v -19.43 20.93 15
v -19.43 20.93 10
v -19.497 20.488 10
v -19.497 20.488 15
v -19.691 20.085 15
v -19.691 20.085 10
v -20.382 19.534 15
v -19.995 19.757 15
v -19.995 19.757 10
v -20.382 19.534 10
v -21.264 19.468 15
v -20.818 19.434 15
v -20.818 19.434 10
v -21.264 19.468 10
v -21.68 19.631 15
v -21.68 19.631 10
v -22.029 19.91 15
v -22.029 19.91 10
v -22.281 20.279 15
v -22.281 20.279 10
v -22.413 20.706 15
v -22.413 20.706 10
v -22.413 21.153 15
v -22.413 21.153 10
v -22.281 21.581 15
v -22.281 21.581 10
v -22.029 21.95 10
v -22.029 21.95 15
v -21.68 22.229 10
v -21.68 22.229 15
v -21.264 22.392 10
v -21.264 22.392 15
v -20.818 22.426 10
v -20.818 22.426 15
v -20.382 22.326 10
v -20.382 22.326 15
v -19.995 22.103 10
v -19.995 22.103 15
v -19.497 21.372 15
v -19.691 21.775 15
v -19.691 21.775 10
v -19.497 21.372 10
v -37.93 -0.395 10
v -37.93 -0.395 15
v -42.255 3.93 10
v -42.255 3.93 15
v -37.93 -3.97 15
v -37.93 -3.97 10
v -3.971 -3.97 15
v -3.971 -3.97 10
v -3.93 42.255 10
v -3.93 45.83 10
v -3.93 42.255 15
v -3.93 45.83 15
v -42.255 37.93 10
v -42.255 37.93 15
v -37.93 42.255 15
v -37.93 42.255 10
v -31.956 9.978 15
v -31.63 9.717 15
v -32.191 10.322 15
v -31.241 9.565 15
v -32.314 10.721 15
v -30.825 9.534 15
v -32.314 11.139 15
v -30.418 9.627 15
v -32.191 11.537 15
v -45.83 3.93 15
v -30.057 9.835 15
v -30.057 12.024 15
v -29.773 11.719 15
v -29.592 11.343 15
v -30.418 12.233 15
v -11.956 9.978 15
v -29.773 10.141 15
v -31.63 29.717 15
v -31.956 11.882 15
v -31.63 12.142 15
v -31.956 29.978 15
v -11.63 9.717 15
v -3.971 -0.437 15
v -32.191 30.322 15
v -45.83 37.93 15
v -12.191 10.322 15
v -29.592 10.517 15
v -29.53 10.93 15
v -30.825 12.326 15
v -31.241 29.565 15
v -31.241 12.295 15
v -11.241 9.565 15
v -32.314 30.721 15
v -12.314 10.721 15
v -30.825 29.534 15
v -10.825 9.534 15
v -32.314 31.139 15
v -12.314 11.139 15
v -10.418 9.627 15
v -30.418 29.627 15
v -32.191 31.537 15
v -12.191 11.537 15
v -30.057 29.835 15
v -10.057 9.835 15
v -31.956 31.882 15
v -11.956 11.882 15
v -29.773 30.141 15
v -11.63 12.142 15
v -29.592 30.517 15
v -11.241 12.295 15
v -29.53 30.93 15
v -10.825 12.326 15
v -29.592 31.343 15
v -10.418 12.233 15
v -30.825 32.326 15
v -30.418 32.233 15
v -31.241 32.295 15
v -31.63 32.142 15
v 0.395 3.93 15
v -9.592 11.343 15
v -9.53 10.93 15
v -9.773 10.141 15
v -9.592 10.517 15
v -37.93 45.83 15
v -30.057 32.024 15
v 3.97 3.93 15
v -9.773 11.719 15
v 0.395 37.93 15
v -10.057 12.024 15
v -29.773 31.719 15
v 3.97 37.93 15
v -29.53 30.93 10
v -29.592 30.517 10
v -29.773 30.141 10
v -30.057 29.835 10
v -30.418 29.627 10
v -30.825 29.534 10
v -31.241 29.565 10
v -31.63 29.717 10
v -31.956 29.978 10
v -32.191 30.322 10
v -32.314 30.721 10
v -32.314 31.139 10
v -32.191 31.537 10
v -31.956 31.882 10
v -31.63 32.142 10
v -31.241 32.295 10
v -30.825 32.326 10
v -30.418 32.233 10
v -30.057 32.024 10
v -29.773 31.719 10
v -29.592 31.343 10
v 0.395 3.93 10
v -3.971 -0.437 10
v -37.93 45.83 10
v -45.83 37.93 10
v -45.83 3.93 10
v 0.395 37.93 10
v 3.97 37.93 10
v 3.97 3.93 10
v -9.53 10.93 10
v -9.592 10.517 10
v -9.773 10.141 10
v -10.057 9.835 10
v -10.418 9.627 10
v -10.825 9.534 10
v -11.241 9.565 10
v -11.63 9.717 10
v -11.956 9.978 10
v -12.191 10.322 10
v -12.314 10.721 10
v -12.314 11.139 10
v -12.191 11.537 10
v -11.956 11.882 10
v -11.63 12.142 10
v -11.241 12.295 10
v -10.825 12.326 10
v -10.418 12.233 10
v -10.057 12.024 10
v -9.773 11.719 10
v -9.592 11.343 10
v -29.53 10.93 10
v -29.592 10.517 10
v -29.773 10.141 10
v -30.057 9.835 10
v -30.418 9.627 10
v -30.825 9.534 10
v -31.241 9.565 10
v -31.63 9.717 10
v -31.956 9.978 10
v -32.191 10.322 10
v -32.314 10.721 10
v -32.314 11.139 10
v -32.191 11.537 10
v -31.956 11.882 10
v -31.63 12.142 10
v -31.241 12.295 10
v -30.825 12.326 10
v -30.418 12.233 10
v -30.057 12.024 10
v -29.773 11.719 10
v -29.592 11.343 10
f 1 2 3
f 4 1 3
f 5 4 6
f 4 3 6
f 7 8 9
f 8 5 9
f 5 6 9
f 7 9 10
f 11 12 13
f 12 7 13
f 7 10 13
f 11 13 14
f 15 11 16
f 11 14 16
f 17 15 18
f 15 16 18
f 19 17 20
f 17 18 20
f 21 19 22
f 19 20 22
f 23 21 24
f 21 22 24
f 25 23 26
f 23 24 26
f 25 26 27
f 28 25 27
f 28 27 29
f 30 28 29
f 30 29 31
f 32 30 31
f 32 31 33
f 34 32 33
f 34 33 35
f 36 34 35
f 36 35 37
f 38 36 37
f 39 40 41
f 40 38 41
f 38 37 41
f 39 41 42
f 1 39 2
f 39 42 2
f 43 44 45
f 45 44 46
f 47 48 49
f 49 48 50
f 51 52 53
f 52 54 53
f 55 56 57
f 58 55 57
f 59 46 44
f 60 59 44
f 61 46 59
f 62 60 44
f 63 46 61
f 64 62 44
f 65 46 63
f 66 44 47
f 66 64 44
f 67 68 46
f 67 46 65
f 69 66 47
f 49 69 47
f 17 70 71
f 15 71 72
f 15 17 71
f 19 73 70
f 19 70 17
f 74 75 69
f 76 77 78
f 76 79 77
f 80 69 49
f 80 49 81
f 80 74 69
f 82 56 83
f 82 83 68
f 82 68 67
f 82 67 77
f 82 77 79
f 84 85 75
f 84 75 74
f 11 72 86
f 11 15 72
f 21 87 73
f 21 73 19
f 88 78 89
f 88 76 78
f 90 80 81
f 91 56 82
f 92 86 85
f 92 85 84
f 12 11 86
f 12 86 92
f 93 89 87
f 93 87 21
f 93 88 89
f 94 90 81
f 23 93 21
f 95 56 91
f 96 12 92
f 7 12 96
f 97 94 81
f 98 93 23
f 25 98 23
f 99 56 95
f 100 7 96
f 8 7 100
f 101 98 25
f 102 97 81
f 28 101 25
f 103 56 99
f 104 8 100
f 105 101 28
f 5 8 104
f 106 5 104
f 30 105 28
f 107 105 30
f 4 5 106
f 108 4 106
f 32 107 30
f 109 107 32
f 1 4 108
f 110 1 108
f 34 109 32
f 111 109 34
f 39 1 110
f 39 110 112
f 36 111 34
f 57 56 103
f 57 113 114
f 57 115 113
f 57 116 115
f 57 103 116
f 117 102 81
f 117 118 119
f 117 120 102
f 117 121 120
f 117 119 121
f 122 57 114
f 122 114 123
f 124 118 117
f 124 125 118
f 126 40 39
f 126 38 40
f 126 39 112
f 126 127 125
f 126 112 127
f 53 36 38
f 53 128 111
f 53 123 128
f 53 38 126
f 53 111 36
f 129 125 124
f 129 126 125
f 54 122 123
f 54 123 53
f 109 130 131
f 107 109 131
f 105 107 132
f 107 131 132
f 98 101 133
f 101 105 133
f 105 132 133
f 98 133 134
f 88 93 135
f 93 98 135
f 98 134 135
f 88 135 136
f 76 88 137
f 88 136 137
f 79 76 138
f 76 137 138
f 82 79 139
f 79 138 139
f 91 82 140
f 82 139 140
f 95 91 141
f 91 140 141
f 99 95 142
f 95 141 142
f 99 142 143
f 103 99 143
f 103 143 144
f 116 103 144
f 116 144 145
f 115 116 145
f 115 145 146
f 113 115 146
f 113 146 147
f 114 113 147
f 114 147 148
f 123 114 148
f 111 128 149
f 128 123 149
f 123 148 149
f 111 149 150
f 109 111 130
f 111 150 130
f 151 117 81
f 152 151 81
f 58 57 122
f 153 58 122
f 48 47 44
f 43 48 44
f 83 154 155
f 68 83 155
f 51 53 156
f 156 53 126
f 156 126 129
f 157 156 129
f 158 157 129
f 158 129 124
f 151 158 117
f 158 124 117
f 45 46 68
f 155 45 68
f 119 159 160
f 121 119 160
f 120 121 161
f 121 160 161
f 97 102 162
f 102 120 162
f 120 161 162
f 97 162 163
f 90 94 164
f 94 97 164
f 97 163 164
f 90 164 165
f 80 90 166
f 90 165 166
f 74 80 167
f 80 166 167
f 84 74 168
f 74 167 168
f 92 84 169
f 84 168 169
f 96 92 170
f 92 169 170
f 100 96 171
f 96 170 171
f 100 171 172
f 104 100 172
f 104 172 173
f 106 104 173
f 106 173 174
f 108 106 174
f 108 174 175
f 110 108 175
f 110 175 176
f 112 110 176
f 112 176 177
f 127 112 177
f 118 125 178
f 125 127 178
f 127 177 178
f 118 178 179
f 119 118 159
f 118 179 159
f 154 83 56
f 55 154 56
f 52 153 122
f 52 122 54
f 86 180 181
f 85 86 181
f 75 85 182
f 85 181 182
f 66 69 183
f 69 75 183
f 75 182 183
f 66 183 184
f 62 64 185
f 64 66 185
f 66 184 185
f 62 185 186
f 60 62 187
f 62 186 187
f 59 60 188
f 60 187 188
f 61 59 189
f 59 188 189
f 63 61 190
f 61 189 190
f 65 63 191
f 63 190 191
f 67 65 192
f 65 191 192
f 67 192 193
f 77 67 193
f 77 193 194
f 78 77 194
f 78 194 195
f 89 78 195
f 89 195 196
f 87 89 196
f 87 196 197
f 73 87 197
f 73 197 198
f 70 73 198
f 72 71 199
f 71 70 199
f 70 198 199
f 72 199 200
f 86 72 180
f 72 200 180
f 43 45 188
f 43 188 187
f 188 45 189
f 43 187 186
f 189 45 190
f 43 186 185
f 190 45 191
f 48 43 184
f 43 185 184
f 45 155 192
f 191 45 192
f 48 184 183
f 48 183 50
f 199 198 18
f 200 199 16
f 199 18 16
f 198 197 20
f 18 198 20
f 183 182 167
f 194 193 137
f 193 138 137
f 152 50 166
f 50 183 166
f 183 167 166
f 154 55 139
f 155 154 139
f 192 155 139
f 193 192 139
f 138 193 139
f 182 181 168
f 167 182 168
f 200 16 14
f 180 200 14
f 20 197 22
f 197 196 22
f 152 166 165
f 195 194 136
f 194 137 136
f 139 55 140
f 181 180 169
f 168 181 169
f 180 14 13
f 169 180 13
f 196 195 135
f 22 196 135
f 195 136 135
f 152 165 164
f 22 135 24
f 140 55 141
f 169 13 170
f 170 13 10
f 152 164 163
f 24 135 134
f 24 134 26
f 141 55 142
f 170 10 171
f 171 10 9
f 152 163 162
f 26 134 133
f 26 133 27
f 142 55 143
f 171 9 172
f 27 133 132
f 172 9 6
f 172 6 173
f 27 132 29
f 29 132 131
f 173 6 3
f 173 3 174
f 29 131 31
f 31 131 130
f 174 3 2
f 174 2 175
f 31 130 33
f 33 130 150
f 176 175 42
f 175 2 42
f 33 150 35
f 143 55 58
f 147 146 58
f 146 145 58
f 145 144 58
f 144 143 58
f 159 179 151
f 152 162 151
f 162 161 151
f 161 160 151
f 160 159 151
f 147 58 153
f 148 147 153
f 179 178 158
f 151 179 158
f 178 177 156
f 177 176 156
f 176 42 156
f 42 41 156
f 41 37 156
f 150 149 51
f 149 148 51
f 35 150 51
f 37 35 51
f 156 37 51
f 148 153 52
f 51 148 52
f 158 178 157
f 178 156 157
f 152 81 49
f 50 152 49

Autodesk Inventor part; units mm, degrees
ref_plane "YZ Plane" through (0, 0, 0) normal (1, 0, 0) x (0, 1, 0)
ref_plane "XZ Plane" through (0, 0, 0) normal (0, 1, 0) x (-1, 0, 0)
ref_plane "Work Plane1" through (0, 0, 10) normal (0, 0, 1) x (1, 0, 0)
sketch "Sketch1" plane through (0, 0, 10) normal (0, 0, 1) x (1, 0, 0)
  line L0 (-4.0299, -0.3538) -> (-2.2322, 1.4439) construction
  arc A0 (-1.4439, 2.2322) -> (-2.2322, 1.4439) centre (-0.9299, 0.9299) ccw construction
  line L1 (-1.4439, 2.2322) -> (0.3538, 4.0299) construction
  line L2 (-37.8299, 42.8299) -> (-37.8299, 37.8299) construction
  line L3 (-37.8299, 37.8299) -> (-42.9208, 37.8299) construction
  line L4 (-37.8299, 42.2137) -> (-37.8299, 45.8299) construction
  line L5 (-37.8299, 45.8299) -> (-4.0299, 45.8299) construction
  line L6 (-4.0299, 45.8299) -> (-4.0299, 42.2137) construction
  line L7 (-4.0299, 4.0299) -> (0.3538, 4.0299) projected
  circle A1 centre (-20.9299, 20.9299) radius 17.5 projected
  line L8 (-20.9299, 58.9723) -> (17.1124, 20.9299) construction
  line L9 (17.1124, 20.9299) -> (-20.9299, -17.1124) construction
  line L10 (-20.9299, -17.1124) -> (-58.9723, 20.9299) construction
  line L11 (-58.9723, 20.9299) -> (-20.9299, 58.9723) construction
  line L12 (-20.9299, 58.9723) -> (-20.9299, -17.1124) construction
  line L13 (17.1124, 20.9299) -> (-58.9723, 20.9299) construction
  line L14 (-20.9299, 58.9723) -> (32.8701, 58.9723) construction
  line L15 (-43.4299, 43.4299) -> (1.5701, 43.4299) construction
  line L16 (1.5701, 43.4299) -> (1.5701, -1.5701) construction
  line L17 (1.5701, -1.5701) -> (-43.4299, -1.5701) construction
  line L18 (-43.4299, -1.5701) -> (-43.4299, 43.4299) construction
  line L19 (-43.4299, 43.4299) -> (1.5701, -1.5701) construction
  line L20 (1.5701, 43.4299) -> (-43.4299, -1.5701) construction
  line L21 (-43.4299, 5.3876) -> (-43.4299, 36.4723)
  line L22 (-43.4299, 36.4723) -> (-36.4723, 43.4299)
  line L23 (-36.4723, 43.4299) -> (-5.3876, 43.4299)
  line L24 (-5.3876, 43.4299) -> (1.5701, 36.4723)
  line L25 (1.5701, 36.4723) -> (1.5701, 5.3876)
  line L26 (1.5701, 5.3876) -> (-5.3876, -1.5701)
  line L27 (-5.3876, -1.5701) -> (-36.4723, -1.5701)
  line L28 (-36.4723, -1.5701) -> (-43.4299, 5.3876)
  line L29 (-4.0299, 42.2137) -> (-37.8299, 42.2137) projected
  line L30 (-4.0299, -0.3538) -> (-4.0299, 4.0299) projected
  circle A2 centre (-20.9299, 20.9299) radius 1.5
  line L31 (-10.9299, 10.9299) -> (-30.9299, 10.9299) construction
  line L32 (-30.9299, 10.9299) -> (-30.9299, 30.9299) construction
  line L33 (-30.9299, 30.9299) -> (-10.9299, 30.9299) construction
  line L34 (-10.9299, 30.9299) -> (-10.9299, 10.9299) construction
  line L35 (-10.9299, 10.9299) -> (-30.9299, 30.9299) construction
  line L36 (-30.9299, 10.9299) -> (-10.9299, 30.9299) construction
  circle A3 centre (-30.9299, 30.9299) radius 1.4
  circle A4 centre (-30.9299, 10.9299) radius 1.4
  circle A5 centre (-10.9299, 10.9299) radius 1.4
  line L37 (-45.8299, 37.8299) -> (-42.0723, 37.8299) construction
  line L38 (-42.1723, 37.7299) -> (-45.8299, 37.7299)
  line L39 (-45.8299, 37.7299) -> (-45.8299, 4.1299)
  line L40 (-45.8299, 4.1299) -> (-42.1723, 4.1299)
  line L41 (-42.1723, 4.1299) -> (-42.1723, 37.7299)
  line L42 (-45.8299, 4.0299) -> (-42.0723, 4.0299) construction
  line L43 (-45.8299, 37.8299) -> (-42.0723, 37.8299) projected
  line L44 (-37.7299, 45.8299) -> (-4.1299, 45.8299)
  line L45 (-4.1299, 45.8299) -> (-4.1299, 42.1723)
  line L46 (-4.1299, 42.1723) -> (-37.7299, 42.1723)
  line L47 (-37.7299, 42.1723) -> (-37.7299, 45.8299)
  line L48 (0.4701, 37.8299) -> (0.4701, 4.0299) construction
  line L49 (0.4701, 4.0299) -> (3.9701, 4.0299) construction
  line L50 (3.9701, 37.8299) -> (3.9701, 4.0299) construction
  line L51 (0.4701, 37.8299) -> (3.9701, 37.8299) construction
  line L52 (-45.8299, -3.9701) -> (-4.0299, -3.9701) construction
  line L53 (0.3124, 37.7299) -> (3.9701, 37.7299)
  line L54 (3.9701, 37.7299) -> (3.9701, 4.1299)
  line L55 (3.9701, 4.1299) -> (0.3124, 4.1299)
  line L56 (0.3124, 4.1299) -> (0.3124, 37.7299)
  line L57 (-4.1713, -0.3538) -> (-37.7299, -0.3538)
  line L58 (-37.7299, -0.3538) -> (-37.7299, -3.9701)
  line L59 (-37.7299, -3.9701) -> (-4.1713, -3.9701)
  line L60 (-4.1713, -3.9701) -> (-4.1713, -0.3538)
  point P0 (-37.8299, 4.0299)
  dimension "d18" = 53.8
  dimension "d19" = 45
  dimension "d20" = 53.8
  dimension "d21" = 45
  dimension "d22" = 45
  dimension "d30" = 20
  dimension "d31" = 20
  dimension "d32" = 2.8
  dimension "d33" = 2.8
  dimension "d34" = 2.8
  dimension "d35" = 3
  dimension "d36" = 0.1
  dimension "d37" = 0.1
  dimension "d38" = 0.1
  dimension "d39" = 0.1
extrude "Extrusion1" add sketch "Sketch1" along normal blind 5 contours L30 L26 L57 L28 L41 L22 L46 L24 L56 L7 | L7 L26 L30 | L56 L24 L25 L26 | L26 L25 L24 L53 L54 L55 | L60 L59 L58 L57 L28 L27 L26 | L26 L27 L28 L57 | L46 L22 L29 L24 | L24 L29 L45 | L40 L39 L38 L22 L21 L28 | L28 L21 L22 L41 | L29 L22 L23 L24 | L24 L23 L22 L29 L47 L44 L45 | L47 L29 L22 | A1
sketch "Skizze4" plane through (0, 0, 15) normal (0, 0, 1) x (1, 0, 0)
  circle A0 centre (-10.9299, 10.9299) radius 1.4 construction
  circle A1 centre (-30.9299, 10.9299) radius 1.4 construction
  circle A2 centre (-30.9299, 30.9299) radius 1.4 construction
  circle A3 centre (-20.9299, 20.9299) radius 1.5 construction
  line L0 (-37.7299, 42.1723) -> (-42.1723, 37.7299) projected
  line L1 (-42.1723, 37.7299) -> (-45.8299, 37.7299) projected
  line L2 (-45.8299, 37.7299) -> (-45.8299, 4.1299) construction
  line L3 (-45.8299, 4.1299) -> (-42.1723, 4.1299) projected
  line L4 (-42.1723, 4.1299) -> (-37.6885, -0.3538) projected
  line L5 (-37.6885, -0.3538) -> (-37.7299, -0.3538) projected
  line L6 (-37.7299, -0.3538) -> (-37.7299, -3.9701) projected
  line L7 (-37.7299, -3.9701) -> (-4.1713, -3.9701) construction
  line L8 (-4.1713, -3.9701) -> (-4.1713, -0.3538) projected
  line L9 (-4.1713, -0.3538) -> (0.3124, 4.1299) projected
  line L10 (0.3124, 4.1299) -> (3.9701, 4.1299) projected
  line L11 (3.9701, 4.1299) -> (3.9701, 37.7299) construction
  line L12 (3.9701, 37.7299) -> (0.3124, 37.7299) projected
  line L13 (0.3124, 37.7299) -> (-4.1299, 42.1723) projected
  line L14 (-4.1299, 42.1723) -> (-4.1299, 45.8299) projected
  line L15 (-4.1299, 45.8299) -> (-37.7299, 45.8299) construction
  line L16 (-37.7299, 45.8299) -> (-37.7299, 42.1723) projected
  line L17 (-37.9299, 46.0299) -> (-3.9299, 46.0299) construction
  line L18 (-3.9299, 46.0299) -> (-3.9299, 42.2551)
  line L19 (-3.9299, 42.2551) -> (0.3953, 37.9299)
  line L20 (0.3953, 37.9299) -> (4.1701, 37.9299)
  line L21 (4.1701, 37.9299) -> (4.1701, 3.9299) construction
  line L22 (4.1701, 3.9299) -> (0.3953, 3.9299)
  line L23 (0.3953, 3.9299) -> (-3.9713, -0.4367)
  line L24 (-3.9713, -0.4367) -> (-3.9713, -4.1701)
  line L25 (-3.9713, -4.1701) -> (-37.9299, -4.1701) construction
  line L26 (-37.9299, -4.1701) -> (-37.9299, -0.3953)
  line L27 (-37.9299, -0.3953) -> (-42.2551, 3.9299)
  line L28 (-42.2551, 3.9299) -> (-46.0299, 3.9299)
  line L29 (-46.0299, 3.9299) -> (-46.0299, 37.9299) construction
  line L30 (-46.0299, 37.9299) -> (-42.2551, 37.9299)
  line L31 (-42.2551, 37.9299) -> (-37.9299, 42.2551)
  line L32 (-37.9299, 42.2551) -> (-37.9299, 46.0299)
  line L33 (-45.8299, 37.7299) -> (-45.8299, 37.9299)
  line L34 (-4.1299, 45.8299) -> (-37.7299, 45.8299) projected
  line L35 (-37.7299, 45.8299) -> (-37.9299, 45.8299)
  line L36 (-4.1299, 45.8299) -> (-3.9299, 45.8299)
  line L37 (3.9701, 37.7299) -> (3.9701, 37.9299)
  line L38 (3.9701, 4.1299) -> (3.9701, 37.7299) projected
  line L39 (3.9701, 4.1299) -> (3.9701, 3.9299)
  line L40 (-4.1713, -3.9701) -> (-3.9713, -3.9701)
  line L41 (-37.7299, -3.9701) -> (-37.9299, -3.9701)
  line L42 (-45.8299, 4.1299) -> (-45.8299, 3.9299)
  point P0 (0, 0)
  dimension "d40" = 0.2
extrude "IM_offset" add sketch "Skizze4" against normal up to surface (5 mm away)
properties part number "20_Cube_Insert_Kinematic_Mirrormount_base_v3"
